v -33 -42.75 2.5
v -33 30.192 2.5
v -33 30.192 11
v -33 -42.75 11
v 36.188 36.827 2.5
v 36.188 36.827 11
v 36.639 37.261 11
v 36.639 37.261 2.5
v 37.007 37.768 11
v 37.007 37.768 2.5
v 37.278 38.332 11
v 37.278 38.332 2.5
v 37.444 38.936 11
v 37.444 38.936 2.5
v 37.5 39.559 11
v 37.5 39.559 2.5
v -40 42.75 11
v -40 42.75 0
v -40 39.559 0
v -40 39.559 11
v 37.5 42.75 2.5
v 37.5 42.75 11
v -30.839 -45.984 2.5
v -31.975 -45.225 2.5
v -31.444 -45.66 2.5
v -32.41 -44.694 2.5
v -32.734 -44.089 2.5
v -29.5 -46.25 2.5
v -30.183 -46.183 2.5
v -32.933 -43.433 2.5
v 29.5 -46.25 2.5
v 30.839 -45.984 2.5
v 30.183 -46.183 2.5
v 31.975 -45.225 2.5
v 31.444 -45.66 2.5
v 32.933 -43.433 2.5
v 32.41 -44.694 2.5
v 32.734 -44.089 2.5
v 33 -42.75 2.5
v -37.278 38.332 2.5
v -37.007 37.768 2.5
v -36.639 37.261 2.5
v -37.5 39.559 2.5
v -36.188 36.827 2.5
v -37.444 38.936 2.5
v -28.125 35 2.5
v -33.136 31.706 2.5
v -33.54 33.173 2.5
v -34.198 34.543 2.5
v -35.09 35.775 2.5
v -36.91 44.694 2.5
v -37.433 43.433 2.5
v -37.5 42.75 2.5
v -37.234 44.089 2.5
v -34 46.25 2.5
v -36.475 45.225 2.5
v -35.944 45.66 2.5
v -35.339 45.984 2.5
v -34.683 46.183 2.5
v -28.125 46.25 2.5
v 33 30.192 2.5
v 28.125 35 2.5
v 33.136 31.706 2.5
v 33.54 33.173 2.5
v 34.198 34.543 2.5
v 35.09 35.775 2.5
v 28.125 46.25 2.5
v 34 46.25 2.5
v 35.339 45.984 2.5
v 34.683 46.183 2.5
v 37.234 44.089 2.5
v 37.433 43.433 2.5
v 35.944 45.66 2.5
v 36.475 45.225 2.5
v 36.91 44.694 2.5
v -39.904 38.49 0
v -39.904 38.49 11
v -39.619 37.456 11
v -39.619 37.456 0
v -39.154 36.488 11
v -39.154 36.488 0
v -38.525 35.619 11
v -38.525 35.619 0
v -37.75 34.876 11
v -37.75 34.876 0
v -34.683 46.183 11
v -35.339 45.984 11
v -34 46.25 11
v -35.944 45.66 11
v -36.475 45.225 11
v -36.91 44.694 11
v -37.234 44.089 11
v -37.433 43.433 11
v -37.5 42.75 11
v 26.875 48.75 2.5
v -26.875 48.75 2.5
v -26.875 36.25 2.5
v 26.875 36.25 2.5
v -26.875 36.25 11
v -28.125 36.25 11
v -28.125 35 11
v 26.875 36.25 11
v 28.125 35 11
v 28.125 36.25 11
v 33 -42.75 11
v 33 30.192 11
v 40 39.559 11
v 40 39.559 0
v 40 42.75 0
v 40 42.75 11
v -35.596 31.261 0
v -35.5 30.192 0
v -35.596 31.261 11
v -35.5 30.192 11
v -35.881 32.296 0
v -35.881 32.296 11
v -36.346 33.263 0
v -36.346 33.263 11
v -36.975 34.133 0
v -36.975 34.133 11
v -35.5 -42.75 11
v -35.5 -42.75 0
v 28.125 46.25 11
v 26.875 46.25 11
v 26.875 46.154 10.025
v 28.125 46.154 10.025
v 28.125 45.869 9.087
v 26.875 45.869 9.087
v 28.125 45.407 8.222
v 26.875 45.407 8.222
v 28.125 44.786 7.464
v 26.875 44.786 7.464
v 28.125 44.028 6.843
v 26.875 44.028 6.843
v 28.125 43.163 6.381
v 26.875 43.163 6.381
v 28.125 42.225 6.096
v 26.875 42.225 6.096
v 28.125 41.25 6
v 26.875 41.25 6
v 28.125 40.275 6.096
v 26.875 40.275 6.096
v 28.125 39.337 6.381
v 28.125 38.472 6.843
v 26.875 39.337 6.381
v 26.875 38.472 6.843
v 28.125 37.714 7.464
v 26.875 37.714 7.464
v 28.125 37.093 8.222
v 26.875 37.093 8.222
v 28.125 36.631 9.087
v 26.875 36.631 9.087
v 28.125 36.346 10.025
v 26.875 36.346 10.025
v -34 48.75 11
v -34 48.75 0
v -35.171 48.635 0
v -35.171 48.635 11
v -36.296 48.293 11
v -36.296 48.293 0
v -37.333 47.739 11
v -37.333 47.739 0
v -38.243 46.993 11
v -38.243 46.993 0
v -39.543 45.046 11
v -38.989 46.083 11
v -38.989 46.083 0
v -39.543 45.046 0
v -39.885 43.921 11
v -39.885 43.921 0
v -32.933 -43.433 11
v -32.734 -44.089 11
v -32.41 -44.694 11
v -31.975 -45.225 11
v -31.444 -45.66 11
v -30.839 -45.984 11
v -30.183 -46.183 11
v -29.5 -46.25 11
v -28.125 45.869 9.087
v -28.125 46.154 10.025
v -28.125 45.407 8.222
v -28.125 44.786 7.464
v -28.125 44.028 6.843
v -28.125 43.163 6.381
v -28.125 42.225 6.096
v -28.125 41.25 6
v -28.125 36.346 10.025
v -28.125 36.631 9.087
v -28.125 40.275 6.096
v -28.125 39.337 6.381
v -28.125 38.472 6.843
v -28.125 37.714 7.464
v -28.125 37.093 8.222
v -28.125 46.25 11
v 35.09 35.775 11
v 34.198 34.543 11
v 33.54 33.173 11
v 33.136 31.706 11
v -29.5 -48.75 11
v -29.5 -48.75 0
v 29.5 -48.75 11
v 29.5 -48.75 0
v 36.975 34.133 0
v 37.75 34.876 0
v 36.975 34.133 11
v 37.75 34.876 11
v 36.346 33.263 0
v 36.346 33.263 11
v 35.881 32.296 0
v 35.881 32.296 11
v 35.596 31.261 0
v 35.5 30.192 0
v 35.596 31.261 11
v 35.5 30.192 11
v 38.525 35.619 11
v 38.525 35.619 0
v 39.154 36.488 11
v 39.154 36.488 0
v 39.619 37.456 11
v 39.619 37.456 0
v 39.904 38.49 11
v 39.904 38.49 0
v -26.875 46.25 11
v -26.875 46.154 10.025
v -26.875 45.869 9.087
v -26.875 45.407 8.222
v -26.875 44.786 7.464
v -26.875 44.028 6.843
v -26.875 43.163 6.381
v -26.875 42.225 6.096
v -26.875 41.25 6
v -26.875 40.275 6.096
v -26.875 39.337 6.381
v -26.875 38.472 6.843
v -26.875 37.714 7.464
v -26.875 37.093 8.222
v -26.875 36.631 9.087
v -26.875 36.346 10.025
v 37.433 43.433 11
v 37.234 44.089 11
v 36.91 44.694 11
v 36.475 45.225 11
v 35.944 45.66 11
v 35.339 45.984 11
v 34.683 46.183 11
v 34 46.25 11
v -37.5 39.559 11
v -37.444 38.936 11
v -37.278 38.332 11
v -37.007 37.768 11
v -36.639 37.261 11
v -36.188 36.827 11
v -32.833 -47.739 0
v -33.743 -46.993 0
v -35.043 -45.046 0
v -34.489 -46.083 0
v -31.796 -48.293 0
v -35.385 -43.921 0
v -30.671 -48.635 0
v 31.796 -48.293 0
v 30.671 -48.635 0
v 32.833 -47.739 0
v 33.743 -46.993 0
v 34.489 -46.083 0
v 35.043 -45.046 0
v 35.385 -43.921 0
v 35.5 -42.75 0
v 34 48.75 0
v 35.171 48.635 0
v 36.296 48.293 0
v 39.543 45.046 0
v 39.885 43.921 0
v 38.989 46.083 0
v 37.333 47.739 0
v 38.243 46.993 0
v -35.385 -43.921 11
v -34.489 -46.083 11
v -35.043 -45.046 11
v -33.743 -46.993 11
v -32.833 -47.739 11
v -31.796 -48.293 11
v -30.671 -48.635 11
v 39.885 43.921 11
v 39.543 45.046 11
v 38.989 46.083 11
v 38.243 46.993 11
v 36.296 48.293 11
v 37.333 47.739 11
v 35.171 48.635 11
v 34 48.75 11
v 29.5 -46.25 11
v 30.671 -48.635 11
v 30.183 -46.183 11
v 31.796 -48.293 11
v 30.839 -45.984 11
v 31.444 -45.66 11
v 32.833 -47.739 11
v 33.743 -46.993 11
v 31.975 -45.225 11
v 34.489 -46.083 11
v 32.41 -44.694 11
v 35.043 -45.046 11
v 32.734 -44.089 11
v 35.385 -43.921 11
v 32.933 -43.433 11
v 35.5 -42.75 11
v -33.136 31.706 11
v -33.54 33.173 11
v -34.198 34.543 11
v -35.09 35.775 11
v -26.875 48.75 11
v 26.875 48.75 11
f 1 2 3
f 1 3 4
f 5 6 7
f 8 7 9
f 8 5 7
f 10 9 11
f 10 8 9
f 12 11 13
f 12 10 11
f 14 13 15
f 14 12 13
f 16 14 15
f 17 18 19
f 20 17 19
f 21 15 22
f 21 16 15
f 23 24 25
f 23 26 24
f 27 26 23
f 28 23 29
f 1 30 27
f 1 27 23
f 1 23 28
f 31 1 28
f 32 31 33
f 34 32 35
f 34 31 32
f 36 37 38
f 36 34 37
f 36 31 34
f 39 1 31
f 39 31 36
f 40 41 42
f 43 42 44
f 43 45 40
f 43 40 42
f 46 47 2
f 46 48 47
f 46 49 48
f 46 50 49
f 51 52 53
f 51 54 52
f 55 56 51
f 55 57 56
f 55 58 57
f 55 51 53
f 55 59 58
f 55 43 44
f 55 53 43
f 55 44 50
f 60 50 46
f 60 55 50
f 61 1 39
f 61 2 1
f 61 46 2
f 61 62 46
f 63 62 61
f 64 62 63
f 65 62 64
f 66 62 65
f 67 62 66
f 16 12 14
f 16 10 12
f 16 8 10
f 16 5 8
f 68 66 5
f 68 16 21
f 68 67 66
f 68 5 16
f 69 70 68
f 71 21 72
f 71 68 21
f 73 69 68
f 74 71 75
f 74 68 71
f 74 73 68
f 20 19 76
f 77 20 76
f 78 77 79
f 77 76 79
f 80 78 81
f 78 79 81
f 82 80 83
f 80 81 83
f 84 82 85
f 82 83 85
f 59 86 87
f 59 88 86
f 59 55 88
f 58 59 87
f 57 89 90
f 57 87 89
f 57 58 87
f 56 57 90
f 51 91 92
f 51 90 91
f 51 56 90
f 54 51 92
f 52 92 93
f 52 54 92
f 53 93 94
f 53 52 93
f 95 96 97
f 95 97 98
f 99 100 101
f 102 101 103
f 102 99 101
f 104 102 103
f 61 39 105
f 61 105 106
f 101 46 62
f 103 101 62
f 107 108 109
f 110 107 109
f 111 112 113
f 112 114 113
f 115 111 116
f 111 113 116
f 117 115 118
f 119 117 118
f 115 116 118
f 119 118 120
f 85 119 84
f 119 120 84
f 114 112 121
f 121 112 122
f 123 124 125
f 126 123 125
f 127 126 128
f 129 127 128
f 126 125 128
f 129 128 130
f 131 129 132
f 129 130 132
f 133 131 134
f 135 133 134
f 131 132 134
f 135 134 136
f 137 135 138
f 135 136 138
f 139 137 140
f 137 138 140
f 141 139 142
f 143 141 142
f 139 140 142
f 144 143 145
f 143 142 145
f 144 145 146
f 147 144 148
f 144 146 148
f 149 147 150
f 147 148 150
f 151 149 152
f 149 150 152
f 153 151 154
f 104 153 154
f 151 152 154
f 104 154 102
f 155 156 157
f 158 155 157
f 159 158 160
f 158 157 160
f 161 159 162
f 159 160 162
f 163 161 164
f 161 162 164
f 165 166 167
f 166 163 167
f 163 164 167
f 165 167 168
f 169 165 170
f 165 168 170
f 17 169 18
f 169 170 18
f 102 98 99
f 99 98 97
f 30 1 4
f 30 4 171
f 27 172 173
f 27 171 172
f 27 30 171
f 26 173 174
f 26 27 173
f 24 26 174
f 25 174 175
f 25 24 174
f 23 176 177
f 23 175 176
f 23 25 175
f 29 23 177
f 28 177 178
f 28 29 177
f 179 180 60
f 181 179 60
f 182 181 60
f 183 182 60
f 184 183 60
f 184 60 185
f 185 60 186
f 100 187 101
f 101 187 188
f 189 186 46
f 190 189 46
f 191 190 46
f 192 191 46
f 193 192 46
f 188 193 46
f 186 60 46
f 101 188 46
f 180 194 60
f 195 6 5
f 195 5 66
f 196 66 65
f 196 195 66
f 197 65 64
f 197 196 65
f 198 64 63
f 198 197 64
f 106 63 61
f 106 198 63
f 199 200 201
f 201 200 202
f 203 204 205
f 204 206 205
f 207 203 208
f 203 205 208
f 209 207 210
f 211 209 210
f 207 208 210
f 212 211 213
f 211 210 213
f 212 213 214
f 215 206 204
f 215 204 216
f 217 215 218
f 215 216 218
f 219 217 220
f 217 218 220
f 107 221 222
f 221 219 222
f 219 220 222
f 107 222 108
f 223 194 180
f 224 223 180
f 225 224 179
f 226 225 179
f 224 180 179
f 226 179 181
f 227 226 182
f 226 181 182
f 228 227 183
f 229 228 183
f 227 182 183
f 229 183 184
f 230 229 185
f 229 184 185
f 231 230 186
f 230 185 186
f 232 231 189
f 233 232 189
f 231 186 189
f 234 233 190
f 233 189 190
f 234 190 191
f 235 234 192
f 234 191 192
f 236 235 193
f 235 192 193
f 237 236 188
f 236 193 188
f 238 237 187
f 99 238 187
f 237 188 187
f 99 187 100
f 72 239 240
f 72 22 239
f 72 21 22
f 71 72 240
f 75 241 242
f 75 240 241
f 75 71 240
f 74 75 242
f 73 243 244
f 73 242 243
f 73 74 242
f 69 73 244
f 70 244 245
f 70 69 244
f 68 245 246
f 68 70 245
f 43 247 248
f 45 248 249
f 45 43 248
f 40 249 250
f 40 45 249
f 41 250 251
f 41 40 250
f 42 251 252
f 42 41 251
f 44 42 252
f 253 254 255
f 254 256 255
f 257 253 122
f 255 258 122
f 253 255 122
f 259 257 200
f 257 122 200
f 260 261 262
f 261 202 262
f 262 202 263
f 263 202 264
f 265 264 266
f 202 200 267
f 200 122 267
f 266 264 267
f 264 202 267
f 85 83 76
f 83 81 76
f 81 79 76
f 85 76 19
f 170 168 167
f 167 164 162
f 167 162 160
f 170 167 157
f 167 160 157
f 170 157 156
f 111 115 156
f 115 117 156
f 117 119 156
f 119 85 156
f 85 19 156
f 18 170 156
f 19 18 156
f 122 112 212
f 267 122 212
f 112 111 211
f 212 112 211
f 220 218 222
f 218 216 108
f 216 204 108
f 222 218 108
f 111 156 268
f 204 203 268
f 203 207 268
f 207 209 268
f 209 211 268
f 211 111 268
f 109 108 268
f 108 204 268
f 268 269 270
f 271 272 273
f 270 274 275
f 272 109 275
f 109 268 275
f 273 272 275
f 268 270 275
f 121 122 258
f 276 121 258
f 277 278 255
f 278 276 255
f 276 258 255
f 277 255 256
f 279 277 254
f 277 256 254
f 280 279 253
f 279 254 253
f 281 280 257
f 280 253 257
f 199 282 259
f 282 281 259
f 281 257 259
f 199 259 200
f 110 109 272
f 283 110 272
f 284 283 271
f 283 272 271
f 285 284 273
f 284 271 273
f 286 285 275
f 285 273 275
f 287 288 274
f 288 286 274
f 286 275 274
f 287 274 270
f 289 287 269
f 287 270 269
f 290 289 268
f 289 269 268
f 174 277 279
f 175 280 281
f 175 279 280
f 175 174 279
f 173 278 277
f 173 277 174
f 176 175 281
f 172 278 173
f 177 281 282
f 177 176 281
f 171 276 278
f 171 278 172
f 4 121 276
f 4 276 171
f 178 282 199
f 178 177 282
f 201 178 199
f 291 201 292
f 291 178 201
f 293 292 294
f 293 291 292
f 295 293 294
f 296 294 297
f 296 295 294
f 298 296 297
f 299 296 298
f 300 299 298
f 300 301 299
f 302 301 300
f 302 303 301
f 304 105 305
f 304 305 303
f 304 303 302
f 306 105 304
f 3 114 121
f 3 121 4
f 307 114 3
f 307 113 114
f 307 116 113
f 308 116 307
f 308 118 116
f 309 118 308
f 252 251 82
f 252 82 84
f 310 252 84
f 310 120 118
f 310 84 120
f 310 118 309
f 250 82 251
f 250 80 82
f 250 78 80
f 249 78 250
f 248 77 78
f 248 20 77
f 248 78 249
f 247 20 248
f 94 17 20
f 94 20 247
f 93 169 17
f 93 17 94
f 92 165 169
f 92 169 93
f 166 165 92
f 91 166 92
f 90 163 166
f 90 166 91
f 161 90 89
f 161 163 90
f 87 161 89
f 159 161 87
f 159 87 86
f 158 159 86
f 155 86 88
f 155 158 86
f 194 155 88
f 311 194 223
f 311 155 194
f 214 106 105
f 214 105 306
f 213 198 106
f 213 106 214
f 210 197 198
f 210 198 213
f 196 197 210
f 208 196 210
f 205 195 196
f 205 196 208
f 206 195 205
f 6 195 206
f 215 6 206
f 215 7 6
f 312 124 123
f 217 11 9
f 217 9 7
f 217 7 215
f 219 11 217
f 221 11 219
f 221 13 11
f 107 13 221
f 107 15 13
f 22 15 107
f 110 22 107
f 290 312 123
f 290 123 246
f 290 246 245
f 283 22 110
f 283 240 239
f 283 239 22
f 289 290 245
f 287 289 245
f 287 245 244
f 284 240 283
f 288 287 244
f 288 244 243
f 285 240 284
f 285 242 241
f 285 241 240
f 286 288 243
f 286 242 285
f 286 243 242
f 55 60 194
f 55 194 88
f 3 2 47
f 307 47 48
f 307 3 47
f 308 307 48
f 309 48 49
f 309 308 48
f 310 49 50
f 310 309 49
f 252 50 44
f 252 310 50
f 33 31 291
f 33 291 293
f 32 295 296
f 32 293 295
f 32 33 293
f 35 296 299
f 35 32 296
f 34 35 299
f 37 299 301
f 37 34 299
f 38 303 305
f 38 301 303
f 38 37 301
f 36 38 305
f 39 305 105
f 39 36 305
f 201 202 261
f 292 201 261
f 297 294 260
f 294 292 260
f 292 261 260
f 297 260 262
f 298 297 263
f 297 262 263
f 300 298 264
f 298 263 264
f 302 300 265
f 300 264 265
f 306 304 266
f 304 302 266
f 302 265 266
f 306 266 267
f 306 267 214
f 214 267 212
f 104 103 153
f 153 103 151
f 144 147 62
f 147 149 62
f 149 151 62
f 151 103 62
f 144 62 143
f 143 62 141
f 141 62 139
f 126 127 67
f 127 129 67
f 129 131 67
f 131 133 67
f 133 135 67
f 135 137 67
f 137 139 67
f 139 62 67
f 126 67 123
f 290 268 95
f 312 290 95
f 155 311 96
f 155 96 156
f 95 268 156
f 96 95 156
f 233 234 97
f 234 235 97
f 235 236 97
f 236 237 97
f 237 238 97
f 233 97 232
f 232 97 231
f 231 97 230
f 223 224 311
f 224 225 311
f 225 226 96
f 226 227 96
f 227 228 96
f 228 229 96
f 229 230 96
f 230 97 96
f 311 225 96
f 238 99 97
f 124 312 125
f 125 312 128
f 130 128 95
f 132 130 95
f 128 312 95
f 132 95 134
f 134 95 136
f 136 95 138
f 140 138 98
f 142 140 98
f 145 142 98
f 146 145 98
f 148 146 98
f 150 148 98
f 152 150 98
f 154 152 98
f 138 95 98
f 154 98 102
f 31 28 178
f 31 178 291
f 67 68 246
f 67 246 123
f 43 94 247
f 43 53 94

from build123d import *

# Parameters (mm, degrees)
F4_DEPTH    = 11
F5_T1_DEPTH = 41
F5_T3_DEPTH = 40.0473750966
F6_R        = 6
F7_T        = -2.5
F8_W        = 56.25
F8_H        = 2.5
F9_DEPTH    = 8.5
F11_DEPTH   = 8.5
F12_R       = 5
F13_DEPTH   = 56.25


# Not quite as in the source:
# - a fillet or chamfer that OpenCascade refuses, or shapes differently, is made with other operations: its cross-section is extruded or revolved along the edge and cut away or added


with BuildPart() as f4:
    # F3 (on Top) → F4 (new body)
    with BuildSketch(Plane.XY):
        Polygon((-35.5, 33.75), (-35.5, -48.75), (35.5, -48.75), (35.5, 33.75), (40, 33.75), (40, 48.75), (-40, 48.75), (-40, 33.75), align=None)
    extrude(amount=F4_DEPTH)

    # F5: fillet of radius 6 on 6 edges, made by hand

    # F5_s2 → F5_t1 (cut)
    with BuildSketch(Plane.XY.offset(-15)):
        with BuildLine():
            ThreePointArc((-35.5, -42.75), (-33.7426406871, -46.9926406871), (-29.5, -48.75))
            Line((-29.5, -48.75), (-35.5, -48.75))
            Line((-35.5, -48.75), (-35.5, -42.75))
        make_face()
        with BuildLine():
            ThreePointArc((29.5, -48.75), (33.7426406871, -46.9926406871), (35.5, -42.75))
            Line((35.5, -42.75), (35.5, -48.75))
            Line((35.5, -48.75), (29.5, -48.75))
        make_face()
        with BuildLine():
            ThreePointArc((40, 42.75), (38.2426406871, 46.9926406871), (34, 48.75))
            Line((34, 48.75), (40, 48.75))
            Line((40, 48.75), (40, 42.75))
        make_face()
        with BuildLine():
            ThreePointArc((-34, 48.75), (-38.2426406871, 46.9926406871), (-40, 42.75))
            Line((-40, 42.75), (-40, 48.75))
            Line((-40, 48.75), (-34, 48.75))
        make_face()
    extrude(amount=F5_T1_DEPTH, mode=Mode.SUBTRACT)

    # F5_s4 → F5_t3 (cut)
    with BuildSketch(Plane.XY.offset(-14.5236875483)):
        with BuildLine():
            ThreePointArc((-40, 39.5594750193), (-38.7434164903, 35.8852404051), (-35.5, 33.75))
            Line((-35.5, 33.75), (-40, 33.75))
            Line((-40, 33.75), (-40, 39.5594750193))
        make_face()
        with BuildLine():
            ThreePointArc((35.5, 33.75), (38.7434164903, 35.8852404051), (40, 39.5594750193))
            Line((40, 39.5594750193), (40, 33.75))
            Line((40, 33.75), (35.5, 33.75))
        make_face()
    extrude(amount=F5_T3_DEPTH, mode=Mode.SUBTRACT)

    # F6
    f6_edges = [f4.edges().sort_by_distance(p)[0] for p in [
        (35.5, 33.75, 5.5),
        (-35.5, 33.75, 5.5),
    ]]
    fillet(f6_edges, radius=F6_R)

    # F7
    f7_openings = [f4.faces().sort_by_distance(p)[0] for p in [
        (0, 0.742075, 11),
    ]]
    offset(amount=F7_T, openings=f7_openings)

    # F8 (on face) → F9 (cut)
    with BuildSketch(Plane.XY.offset(11)):
        with Locations((0, 47.5)):
            Rectangle(F8_W, F8_H)
    extrude(amount=-F9_DEPTH, mode=Mode.SUBTRACT)

    # F10 (on face) → F11 (join)
    with BuildSketch(Plane.XY.offset(2.5)):
        Polygon((-28.125, 48.75), (-28.125, 46.25), (-28.125, 35), (28.125, 35), (28.125, 48.75), (26.875, 48.75), (26.875, 36.25), (-26.875, 36.25), (-26.875, 48.75), align=None)
    extrude(amount=F11_DEPTH)

    # F12 (on face) → F13 (cut)
    with BuildSketch(Plane(origin=(-28.125, 0, 0), x_dir=(0, -1, 0), z_dir=(-1, 0, 0))):
        with Locations((-41.25, 11)):
            Circle(F12_R)
    extrude(amount=-F13_DEPTH, mode=Mode.SUBTRACT)


solid = f4.part
